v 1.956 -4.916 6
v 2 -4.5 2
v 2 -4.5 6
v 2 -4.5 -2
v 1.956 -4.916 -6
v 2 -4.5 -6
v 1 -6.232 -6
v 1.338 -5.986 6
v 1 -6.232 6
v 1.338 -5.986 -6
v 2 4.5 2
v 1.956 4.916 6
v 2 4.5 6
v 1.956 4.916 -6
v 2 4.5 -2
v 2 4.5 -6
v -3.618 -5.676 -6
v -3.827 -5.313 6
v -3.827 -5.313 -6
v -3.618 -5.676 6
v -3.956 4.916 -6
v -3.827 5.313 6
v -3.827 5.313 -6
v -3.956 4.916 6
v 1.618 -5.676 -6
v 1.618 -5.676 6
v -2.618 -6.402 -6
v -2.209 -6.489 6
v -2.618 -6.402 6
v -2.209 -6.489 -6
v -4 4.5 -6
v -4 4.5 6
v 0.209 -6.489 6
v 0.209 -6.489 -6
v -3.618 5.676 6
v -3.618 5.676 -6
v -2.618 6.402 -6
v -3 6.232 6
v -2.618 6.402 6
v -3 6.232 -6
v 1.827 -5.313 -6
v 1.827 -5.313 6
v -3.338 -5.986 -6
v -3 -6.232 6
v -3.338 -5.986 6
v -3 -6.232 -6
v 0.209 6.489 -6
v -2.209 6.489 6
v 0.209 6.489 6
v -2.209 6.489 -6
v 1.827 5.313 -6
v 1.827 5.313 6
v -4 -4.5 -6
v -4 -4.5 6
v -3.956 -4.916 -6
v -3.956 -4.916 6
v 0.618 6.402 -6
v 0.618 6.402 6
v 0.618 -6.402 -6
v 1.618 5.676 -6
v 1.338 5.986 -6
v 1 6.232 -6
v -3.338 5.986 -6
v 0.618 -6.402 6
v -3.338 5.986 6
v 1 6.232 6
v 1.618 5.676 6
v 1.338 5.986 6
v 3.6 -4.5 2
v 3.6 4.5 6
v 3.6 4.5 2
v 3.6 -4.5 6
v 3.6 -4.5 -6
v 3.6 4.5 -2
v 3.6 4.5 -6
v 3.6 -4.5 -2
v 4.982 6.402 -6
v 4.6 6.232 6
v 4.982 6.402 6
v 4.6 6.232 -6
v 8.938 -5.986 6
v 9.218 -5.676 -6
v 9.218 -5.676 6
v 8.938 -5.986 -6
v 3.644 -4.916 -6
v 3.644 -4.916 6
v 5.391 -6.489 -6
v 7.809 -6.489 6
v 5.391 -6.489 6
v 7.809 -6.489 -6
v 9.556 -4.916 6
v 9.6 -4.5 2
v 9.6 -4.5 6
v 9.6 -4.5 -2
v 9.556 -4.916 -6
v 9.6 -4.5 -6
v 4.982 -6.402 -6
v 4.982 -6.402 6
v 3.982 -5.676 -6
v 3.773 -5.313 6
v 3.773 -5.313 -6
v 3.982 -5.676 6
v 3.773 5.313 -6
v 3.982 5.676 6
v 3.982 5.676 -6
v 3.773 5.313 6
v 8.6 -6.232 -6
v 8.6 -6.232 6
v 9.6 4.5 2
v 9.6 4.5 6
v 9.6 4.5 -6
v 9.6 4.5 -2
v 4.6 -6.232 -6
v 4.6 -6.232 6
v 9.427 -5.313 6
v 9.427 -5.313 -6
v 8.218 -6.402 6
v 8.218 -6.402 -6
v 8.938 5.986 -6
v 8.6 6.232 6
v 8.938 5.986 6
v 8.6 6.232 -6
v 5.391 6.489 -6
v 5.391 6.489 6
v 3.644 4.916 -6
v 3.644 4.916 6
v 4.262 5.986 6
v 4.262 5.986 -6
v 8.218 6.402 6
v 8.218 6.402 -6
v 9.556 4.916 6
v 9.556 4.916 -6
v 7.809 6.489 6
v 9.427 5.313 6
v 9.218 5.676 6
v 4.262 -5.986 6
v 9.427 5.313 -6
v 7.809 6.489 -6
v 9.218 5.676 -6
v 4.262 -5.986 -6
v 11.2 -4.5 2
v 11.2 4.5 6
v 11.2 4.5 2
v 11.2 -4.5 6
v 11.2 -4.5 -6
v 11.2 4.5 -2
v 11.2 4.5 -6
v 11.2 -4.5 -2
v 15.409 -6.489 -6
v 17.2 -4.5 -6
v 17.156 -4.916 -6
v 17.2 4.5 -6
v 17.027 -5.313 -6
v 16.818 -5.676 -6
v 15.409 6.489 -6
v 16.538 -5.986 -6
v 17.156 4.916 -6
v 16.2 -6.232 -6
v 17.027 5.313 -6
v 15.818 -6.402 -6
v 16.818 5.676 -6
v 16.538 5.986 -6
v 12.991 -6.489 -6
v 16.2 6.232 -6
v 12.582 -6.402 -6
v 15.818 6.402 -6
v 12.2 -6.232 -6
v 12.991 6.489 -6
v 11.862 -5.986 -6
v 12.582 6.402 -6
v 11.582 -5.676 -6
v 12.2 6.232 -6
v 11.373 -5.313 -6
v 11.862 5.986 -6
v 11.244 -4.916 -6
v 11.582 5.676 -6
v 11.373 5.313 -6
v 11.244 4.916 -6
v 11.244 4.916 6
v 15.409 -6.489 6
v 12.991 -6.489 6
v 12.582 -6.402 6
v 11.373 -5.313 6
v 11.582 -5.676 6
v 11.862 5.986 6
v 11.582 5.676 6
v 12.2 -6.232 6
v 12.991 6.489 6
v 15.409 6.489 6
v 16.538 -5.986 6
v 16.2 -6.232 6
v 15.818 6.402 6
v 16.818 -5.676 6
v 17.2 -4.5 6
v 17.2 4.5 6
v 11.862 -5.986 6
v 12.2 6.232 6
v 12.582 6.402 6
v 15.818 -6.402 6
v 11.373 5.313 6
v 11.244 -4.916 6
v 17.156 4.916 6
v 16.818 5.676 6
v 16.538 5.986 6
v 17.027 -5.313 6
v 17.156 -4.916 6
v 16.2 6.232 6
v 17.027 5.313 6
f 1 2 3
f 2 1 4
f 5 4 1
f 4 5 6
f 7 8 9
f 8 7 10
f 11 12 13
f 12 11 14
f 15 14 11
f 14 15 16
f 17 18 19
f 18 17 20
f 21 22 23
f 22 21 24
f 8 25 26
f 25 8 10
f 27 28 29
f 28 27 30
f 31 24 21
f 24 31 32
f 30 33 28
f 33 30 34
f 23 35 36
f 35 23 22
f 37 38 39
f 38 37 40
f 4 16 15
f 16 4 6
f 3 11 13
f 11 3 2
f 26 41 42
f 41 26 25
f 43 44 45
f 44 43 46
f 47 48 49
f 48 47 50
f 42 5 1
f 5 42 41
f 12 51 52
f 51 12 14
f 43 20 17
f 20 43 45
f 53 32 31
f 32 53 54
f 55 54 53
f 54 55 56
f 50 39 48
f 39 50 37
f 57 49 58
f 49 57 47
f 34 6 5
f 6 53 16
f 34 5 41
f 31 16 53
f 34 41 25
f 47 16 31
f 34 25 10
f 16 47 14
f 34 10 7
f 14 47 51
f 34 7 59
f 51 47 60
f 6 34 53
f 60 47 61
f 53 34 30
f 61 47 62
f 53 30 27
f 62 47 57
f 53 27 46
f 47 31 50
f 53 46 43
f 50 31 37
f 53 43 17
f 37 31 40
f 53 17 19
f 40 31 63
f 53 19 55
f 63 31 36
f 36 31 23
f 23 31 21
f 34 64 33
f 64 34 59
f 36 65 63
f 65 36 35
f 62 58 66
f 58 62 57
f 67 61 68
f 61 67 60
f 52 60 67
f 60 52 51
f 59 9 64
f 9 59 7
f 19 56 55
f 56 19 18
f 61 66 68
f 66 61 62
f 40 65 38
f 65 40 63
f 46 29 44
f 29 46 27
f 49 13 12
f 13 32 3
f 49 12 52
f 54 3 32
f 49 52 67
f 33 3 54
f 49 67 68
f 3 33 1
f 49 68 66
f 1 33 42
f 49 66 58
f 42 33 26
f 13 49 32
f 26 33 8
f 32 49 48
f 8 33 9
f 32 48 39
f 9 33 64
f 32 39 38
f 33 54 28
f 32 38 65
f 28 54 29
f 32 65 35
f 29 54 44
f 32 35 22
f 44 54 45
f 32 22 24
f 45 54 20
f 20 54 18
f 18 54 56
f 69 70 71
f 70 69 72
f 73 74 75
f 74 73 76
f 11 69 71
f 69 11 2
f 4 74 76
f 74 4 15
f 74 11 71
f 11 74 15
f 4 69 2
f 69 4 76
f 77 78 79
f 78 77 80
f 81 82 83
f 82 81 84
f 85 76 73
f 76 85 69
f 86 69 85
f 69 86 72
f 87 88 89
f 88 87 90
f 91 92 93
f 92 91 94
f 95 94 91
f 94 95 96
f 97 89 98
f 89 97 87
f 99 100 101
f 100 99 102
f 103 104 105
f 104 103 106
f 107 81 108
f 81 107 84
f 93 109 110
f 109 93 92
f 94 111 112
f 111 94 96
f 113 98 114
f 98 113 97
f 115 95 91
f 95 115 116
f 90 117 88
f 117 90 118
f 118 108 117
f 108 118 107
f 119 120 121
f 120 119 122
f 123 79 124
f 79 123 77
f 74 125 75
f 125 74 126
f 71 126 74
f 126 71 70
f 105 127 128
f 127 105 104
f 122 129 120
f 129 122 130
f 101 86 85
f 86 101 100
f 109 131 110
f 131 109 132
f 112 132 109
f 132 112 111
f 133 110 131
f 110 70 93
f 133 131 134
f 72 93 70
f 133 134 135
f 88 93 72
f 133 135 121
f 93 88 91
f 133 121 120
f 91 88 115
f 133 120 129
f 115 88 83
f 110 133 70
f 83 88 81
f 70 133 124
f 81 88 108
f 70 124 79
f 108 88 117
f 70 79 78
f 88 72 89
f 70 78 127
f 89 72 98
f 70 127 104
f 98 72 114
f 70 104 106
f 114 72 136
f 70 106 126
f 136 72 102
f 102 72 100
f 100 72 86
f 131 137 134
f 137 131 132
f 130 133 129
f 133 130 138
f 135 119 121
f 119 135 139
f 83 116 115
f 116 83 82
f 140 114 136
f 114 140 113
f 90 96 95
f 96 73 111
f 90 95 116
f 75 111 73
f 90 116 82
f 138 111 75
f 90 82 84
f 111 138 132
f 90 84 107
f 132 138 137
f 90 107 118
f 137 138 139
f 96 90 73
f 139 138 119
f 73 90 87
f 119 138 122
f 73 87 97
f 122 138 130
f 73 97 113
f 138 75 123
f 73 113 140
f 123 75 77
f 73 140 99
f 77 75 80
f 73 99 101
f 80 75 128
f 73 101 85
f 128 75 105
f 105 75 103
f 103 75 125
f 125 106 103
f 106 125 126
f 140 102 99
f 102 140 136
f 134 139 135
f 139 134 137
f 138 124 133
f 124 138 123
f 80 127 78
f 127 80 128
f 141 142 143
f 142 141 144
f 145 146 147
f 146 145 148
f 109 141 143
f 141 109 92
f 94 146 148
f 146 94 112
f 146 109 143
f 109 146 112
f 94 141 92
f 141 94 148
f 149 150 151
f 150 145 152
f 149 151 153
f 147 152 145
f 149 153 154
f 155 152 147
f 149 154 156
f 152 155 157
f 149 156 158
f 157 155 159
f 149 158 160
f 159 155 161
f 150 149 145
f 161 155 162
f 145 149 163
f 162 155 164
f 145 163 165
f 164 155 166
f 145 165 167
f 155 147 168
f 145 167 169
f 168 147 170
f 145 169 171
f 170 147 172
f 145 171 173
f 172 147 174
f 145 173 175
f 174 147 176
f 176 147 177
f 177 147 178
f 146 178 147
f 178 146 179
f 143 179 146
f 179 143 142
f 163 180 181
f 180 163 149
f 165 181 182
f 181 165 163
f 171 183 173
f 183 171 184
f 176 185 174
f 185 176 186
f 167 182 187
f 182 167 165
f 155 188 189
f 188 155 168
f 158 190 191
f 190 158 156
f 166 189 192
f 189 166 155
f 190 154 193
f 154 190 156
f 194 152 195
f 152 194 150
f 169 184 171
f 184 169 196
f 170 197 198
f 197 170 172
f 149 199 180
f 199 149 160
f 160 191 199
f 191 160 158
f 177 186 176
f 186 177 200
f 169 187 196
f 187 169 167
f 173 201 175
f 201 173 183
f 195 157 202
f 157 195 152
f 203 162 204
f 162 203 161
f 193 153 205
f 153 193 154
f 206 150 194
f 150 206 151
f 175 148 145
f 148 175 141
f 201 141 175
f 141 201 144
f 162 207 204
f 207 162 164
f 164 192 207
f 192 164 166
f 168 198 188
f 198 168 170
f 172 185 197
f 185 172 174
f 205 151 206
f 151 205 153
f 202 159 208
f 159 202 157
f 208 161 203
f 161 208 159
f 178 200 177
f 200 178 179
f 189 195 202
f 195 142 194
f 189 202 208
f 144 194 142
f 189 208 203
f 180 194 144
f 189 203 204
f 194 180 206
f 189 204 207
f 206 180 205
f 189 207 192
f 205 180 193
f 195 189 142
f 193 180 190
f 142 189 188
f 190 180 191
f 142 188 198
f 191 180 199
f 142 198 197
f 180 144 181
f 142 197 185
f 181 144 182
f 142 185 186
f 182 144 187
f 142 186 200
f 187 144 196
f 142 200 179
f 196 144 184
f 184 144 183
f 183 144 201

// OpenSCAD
$fn=30;
height=12;
radius=2;
union(){
    hull(){
        translate([0,-4.5,0])cylinder(r=radius,h=height, center=true);
        translate([-2,4.5,0])cylinder(r=radius,h=height, center=true);
        translate([0,4.5,0])cylinder(r=radius,h=height, center=true);
        translate([-2,-4.5,0])cylinder(r=radius,h=height, center=true);
  }
  translate([2.8,0,0])cube([radius/1.25,radius+7,radius+2],center=true);
   translate([7.6,0,0]) hull(){
        translate([0,-4.5,0])cylinder(r=radius,h=height, center=true);
        translate([-2,4.5,0])cylinder(r=radius,h=height, center=true);
        translate([0,4.5,0])cylinder(r=radius,h=height, center=true);
        translate([-2,-4.5,0])cylinder(r=radius,h=height, center=true);
  }
  translate([10.4,0,0])cube([radius/1.25,radius+7,radius+2],center=true);
   translate([15.2,0,0]) hull(){
        translate([0,-4.5,0])cylinder(r=radius,h=height, center=true);
        translate([-2,4.5,0])cylinder(r=radius,h=height, center=true);
        translate([0,4.5,0])cylinder(r=radius,h=height, center=true);
        translate([-2,-4.5,0])cylinder(r=radius,h=height, center=true);
  }
}
